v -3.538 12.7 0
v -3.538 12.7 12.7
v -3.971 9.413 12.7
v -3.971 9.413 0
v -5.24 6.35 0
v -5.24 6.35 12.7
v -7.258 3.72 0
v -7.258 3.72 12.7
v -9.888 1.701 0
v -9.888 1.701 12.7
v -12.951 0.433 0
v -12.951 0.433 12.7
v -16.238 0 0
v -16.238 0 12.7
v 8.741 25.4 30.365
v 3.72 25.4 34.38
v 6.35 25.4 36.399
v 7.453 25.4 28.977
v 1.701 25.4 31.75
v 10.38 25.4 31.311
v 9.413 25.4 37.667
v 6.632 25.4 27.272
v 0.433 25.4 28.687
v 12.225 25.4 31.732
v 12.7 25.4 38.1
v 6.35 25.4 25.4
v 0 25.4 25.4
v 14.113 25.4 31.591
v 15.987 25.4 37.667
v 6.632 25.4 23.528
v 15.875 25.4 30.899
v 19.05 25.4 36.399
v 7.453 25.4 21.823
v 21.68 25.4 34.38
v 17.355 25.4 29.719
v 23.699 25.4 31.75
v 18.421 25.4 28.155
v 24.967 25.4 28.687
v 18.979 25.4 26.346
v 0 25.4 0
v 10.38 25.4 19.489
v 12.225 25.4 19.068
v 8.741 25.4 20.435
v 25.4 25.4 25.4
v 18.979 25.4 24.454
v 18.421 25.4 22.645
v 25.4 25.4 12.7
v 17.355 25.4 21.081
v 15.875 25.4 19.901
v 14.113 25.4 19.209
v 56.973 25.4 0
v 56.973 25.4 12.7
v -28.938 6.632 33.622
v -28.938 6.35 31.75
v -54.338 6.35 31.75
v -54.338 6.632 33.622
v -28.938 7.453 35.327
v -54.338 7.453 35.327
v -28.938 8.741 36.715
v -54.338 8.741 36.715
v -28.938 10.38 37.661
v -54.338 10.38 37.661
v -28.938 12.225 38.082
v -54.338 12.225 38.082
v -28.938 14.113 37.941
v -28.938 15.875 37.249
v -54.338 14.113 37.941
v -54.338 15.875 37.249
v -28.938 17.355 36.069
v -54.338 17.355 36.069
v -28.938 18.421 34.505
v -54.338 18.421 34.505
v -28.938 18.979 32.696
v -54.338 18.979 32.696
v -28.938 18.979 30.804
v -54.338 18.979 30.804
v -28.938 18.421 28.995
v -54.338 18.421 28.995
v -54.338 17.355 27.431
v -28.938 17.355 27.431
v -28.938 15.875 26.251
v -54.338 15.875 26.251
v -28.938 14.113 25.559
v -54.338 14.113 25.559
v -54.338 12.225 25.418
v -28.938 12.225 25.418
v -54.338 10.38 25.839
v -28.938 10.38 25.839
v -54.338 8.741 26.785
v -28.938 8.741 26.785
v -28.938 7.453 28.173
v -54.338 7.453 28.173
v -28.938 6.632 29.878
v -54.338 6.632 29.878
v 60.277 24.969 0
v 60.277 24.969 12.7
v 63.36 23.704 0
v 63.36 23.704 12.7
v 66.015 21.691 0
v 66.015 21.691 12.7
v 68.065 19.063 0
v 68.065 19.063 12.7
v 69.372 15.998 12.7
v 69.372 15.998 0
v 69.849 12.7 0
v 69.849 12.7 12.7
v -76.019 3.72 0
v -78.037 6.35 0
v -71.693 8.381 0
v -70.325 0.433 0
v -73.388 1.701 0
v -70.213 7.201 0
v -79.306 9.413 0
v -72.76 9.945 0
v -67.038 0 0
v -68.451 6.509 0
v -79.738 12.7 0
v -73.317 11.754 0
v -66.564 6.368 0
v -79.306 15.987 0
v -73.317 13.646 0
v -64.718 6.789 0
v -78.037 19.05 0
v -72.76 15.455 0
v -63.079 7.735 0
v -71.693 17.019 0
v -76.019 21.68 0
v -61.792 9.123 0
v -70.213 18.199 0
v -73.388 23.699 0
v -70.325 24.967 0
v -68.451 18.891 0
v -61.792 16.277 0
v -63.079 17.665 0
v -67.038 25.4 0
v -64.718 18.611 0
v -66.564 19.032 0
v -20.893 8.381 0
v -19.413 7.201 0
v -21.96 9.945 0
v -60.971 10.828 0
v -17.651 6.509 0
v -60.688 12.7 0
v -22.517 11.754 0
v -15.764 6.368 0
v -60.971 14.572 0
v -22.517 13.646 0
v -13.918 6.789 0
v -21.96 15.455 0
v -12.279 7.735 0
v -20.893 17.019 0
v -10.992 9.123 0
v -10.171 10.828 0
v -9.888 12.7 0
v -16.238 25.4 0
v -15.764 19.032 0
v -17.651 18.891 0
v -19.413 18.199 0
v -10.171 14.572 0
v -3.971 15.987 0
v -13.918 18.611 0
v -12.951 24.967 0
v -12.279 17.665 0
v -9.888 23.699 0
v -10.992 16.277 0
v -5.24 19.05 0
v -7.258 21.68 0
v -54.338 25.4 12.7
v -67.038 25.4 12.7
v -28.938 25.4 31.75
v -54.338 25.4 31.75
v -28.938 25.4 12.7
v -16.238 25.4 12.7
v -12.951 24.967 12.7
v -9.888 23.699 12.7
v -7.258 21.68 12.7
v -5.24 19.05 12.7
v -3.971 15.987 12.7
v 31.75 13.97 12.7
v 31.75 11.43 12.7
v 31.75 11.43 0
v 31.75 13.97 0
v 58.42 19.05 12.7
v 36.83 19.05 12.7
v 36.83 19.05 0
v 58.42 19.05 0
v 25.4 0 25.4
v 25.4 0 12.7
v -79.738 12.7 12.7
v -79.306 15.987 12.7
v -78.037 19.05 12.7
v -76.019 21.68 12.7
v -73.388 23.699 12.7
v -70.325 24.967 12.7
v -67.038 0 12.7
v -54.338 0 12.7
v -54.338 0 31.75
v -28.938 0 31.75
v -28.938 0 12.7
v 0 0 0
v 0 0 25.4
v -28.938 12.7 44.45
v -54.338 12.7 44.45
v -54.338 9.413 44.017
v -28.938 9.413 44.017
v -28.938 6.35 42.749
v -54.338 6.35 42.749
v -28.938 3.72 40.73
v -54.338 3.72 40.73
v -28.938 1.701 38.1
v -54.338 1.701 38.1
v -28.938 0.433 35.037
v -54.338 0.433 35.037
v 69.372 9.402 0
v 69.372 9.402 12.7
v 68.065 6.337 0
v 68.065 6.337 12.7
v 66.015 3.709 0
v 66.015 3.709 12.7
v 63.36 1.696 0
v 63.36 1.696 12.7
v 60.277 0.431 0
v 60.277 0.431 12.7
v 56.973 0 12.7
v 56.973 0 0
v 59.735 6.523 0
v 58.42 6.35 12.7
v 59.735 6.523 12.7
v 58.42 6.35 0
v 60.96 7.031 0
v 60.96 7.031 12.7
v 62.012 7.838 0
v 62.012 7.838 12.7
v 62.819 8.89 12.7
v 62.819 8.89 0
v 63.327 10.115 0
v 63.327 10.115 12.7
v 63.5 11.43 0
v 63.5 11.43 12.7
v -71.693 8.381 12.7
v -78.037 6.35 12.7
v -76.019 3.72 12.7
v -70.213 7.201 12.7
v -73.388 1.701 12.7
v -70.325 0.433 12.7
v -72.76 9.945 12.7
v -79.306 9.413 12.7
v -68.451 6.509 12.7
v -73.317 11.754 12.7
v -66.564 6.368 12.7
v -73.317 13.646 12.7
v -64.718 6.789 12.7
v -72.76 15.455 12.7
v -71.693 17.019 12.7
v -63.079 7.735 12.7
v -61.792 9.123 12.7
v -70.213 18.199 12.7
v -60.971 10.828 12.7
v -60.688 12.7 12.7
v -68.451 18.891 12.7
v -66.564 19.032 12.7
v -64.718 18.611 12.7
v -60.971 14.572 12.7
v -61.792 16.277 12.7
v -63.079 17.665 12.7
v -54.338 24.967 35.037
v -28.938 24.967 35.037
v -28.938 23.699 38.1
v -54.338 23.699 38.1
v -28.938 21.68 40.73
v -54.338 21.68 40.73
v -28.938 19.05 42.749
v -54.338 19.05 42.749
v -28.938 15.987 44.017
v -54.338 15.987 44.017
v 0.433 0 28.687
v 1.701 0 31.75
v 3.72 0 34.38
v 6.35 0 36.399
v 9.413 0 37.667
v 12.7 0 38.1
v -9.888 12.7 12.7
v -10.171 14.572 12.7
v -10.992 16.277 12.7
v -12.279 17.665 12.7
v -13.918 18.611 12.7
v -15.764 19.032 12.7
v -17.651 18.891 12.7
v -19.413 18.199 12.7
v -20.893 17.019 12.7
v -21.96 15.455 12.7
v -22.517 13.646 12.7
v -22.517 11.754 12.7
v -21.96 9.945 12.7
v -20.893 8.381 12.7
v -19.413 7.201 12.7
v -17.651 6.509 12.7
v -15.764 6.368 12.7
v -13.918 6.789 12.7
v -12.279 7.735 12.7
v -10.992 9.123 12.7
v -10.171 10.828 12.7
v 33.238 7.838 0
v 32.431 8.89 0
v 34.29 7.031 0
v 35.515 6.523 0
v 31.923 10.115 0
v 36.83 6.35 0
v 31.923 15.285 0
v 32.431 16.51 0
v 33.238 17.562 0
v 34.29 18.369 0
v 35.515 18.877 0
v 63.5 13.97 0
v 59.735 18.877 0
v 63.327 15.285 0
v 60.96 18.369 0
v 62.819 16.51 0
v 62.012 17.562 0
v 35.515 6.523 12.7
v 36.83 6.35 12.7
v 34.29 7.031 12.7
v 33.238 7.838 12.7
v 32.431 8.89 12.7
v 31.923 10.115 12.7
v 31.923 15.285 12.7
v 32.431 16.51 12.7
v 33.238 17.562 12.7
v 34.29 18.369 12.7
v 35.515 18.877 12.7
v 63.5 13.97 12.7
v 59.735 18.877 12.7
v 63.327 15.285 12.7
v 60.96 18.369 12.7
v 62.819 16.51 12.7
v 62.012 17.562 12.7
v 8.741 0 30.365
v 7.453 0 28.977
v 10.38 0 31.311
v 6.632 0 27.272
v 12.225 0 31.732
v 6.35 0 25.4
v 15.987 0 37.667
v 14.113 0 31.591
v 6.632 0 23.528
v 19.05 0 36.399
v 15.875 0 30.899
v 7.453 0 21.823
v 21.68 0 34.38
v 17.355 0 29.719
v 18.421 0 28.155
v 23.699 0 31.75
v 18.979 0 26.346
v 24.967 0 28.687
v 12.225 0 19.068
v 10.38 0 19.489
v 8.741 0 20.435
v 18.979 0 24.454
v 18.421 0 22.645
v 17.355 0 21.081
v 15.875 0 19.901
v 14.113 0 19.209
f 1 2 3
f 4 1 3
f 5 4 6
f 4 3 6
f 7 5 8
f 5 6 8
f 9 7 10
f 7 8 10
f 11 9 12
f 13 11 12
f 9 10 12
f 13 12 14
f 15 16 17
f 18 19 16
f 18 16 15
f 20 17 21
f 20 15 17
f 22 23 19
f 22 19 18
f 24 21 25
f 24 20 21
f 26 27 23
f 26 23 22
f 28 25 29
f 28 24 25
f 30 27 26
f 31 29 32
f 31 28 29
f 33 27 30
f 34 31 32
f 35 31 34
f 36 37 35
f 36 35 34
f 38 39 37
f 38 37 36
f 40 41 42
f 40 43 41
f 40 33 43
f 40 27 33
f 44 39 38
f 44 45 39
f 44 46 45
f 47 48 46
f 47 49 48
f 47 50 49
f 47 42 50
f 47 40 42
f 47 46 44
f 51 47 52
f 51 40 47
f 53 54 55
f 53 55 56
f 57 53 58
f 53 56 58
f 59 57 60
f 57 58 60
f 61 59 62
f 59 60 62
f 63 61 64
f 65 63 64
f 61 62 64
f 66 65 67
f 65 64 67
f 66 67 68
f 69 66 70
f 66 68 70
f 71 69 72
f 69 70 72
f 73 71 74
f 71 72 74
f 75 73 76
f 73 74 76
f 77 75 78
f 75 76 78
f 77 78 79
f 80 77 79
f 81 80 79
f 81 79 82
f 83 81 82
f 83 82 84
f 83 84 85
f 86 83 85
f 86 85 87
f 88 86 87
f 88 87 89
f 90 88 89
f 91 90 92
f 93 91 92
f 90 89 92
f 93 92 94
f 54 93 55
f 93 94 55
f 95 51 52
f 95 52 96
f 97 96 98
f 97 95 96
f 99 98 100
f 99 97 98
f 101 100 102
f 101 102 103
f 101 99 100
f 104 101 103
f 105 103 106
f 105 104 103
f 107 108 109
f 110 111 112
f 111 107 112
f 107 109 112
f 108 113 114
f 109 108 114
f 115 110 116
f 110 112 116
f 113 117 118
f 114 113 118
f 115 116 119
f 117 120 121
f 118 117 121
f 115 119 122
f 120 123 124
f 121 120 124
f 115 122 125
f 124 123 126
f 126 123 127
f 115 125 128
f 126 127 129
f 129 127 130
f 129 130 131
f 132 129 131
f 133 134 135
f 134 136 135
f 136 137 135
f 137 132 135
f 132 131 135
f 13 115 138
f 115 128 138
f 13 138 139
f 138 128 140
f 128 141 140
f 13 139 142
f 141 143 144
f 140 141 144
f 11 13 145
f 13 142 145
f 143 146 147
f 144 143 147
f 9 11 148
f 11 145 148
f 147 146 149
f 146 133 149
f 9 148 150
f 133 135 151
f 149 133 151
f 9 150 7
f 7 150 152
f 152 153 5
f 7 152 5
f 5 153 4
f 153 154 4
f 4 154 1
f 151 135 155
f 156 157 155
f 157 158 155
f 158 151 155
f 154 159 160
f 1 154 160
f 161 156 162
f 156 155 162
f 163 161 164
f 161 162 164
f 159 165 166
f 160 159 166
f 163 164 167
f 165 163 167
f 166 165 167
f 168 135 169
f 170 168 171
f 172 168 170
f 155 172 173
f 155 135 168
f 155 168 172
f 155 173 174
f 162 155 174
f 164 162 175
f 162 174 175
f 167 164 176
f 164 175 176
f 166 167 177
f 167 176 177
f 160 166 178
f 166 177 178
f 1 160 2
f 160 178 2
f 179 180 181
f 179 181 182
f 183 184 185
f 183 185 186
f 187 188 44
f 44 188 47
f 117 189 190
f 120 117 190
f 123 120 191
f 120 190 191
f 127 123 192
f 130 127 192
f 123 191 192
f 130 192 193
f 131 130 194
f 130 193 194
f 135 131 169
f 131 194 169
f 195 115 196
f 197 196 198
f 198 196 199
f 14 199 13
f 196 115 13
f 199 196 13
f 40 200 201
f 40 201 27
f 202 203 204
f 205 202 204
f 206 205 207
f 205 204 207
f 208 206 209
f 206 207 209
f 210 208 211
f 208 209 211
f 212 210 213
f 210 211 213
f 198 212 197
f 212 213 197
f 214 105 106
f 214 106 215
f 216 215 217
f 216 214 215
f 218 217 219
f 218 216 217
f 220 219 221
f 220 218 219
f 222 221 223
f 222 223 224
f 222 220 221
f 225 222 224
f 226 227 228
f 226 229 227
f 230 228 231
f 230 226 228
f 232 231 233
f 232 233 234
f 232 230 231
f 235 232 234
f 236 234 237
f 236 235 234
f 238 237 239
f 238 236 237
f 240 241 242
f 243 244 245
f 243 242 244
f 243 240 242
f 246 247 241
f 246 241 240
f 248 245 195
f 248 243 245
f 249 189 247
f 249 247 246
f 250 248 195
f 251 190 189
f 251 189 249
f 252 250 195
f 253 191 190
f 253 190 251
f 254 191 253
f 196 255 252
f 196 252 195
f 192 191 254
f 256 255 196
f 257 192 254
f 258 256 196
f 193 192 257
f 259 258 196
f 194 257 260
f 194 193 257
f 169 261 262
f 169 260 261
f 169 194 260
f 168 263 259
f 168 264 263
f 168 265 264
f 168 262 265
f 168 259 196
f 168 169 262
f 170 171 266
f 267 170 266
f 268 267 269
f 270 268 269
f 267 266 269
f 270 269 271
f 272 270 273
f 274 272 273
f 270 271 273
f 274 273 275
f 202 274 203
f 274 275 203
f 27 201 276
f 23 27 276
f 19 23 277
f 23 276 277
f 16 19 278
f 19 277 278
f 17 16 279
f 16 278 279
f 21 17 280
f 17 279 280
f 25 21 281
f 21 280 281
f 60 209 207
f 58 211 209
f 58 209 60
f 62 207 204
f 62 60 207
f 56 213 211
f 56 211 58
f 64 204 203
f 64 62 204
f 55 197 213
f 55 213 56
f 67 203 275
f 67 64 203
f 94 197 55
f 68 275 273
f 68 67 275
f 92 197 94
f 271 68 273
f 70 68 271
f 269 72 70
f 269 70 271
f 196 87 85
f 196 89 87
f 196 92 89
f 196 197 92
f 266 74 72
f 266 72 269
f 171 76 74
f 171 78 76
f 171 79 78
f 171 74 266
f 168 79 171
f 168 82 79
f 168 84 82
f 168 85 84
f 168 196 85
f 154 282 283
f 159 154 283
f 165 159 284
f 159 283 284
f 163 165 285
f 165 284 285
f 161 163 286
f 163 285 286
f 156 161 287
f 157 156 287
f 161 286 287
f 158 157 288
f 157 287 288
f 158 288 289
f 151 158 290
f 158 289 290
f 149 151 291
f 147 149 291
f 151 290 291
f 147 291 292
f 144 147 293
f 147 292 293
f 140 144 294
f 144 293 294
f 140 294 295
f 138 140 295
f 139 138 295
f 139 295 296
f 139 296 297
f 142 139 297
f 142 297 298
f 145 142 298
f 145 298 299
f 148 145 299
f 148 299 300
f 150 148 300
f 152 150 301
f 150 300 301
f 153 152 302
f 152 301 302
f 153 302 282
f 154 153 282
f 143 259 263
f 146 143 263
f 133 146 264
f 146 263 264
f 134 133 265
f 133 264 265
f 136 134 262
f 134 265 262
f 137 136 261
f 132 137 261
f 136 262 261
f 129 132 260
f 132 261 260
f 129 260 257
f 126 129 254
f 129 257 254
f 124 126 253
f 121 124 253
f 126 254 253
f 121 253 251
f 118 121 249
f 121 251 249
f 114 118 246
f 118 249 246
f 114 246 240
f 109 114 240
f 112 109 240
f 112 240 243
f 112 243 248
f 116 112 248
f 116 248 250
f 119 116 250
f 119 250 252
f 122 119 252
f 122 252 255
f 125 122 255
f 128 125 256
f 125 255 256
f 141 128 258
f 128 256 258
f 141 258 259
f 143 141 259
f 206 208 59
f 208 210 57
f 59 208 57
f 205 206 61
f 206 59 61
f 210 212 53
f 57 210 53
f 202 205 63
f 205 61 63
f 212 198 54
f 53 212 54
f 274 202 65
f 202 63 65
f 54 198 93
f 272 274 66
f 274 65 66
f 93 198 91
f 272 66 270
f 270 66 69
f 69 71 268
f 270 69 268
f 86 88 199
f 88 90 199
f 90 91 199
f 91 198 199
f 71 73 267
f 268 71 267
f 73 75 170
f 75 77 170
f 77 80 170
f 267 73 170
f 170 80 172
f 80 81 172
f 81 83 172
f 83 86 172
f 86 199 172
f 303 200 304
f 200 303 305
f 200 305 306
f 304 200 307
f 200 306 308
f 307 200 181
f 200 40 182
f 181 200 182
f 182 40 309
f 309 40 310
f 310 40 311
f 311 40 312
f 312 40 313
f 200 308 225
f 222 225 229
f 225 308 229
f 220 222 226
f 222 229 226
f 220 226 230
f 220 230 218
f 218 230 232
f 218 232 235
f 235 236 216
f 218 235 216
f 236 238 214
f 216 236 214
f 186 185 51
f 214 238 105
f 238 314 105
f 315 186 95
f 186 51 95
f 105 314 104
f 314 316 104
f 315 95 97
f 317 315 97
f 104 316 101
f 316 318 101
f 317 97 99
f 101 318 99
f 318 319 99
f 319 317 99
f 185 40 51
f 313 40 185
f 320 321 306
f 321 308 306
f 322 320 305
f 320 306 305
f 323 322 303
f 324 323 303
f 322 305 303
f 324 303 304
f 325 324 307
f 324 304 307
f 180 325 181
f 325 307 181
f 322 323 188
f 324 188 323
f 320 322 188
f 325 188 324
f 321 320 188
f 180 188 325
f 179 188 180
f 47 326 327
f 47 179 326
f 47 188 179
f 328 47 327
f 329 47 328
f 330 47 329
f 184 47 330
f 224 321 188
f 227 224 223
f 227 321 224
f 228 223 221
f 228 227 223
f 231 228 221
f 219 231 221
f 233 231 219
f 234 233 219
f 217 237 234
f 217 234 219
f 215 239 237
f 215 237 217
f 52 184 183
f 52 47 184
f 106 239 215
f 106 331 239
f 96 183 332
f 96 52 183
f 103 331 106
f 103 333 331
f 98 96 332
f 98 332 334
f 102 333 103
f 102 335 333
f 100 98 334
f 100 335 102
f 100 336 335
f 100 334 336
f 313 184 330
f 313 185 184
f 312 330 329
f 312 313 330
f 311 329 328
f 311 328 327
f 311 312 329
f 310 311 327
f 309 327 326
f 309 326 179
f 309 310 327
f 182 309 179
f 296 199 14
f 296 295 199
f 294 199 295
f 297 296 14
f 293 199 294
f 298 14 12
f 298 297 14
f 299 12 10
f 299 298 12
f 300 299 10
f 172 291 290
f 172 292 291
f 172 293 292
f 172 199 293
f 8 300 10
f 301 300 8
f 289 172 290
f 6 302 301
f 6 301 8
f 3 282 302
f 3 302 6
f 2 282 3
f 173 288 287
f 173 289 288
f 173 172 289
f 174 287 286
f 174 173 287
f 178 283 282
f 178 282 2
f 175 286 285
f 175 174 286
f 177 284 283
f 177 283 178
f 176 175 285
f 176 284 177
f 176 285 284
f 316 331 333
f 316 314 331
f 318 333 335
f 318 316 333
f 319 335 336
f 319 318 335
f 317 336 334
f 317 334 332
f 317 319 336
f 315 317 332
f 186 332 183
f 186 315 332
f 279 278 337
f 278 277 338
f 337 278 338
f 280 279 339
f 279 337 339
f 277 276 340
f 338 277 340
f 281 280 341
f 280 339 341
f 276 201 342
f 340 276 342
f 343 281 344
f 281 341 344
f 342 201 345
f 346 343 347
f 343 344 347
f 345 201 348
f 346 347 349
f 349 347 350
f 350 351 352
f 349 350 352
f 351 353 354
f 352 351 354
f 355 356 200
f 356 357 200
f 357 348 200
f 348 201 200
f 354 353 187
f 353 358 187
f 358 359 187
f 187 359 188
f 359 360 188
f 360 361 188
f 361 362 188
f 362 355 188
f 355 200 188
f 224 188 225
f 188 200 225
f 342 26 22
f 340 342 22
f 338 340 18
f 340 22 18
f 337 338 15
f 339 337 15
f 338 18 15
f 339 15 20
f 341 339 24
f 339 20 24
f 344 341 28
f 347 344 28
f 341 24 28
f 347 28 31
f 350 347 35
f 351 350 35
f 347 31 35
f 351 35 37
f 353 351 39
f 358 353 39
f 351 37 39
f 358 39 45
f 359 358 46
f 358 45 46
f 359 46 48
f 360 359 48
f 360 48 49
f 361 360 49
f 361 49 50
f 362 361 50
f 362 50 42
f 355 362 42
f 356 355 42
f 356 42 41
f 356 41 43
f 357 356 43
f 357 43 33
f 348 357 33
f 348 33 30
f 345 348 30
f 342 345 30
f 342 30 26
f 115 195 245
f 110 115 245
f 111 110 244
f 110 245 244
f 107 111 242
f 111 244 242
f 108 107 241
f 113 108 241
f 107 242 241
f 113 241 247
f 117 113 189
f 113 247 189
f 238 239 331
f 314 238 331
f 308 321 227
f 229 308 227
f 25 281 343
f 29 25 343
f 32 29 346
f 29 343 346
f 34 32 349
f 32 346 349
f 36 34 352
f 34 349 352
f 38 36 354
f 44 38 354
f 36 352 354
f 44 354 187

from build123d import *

# Parameters (mm, degrees)
F0_W         = 69.85
F0_H         = 25.4
F1_DEPTH     = 12.7
F2_W         = 25.4
F2_H         = 25.4
F3_DEPTH     = 25.4
F5_D         = 12.7
F6_W         = 31.75
F6_H         = 12.7
F7_DEPTH     = 12.7
F9_DEPTH     = 25.4
F10_DEPTH    = 25.4
F11_R        = 5.08
F12_T1_DEPTH = 77.0870757085
F13_W        = 76.2
F13_H        = 25.4
F14_DEPTH    = 12.7
F15_W        = 25.4
F15_H        = 25.4
F16_DEPTH    = 31.75
F17_R        = 6.35
F18_DEPTH    = 12.7
F19_R        = 6.35
F20_DEPTH    = 12.7
F21_R        = 6.35
F22_DEPTH    = 25.4


# Not quite as in the source:
# - a fillet or chamfer that OpenCascade refuses, or shapes differently, is made with other operations: its cross-section is extruded or revolved along the edge and cut away or added


with BuildPart() as f1:
    # F0 (on Top) → F1 (new body)
    with BuildSketch(Plane.XY):
        with Locations((34.925, 12.7)):
            Rectangle(F0_W, F0_H)
    extrude(amount=F1_DEPTH)

    # F2 (on face) → F3 (join)
    with BuildSketch(Plane.XY.offset(12.7)):
        with Locations((12.7, 12.7)):
            Rectangle(F2_W, F2_H)
    extrude(amount=F3_DEPTH)

    # F5 (through all)
    with Locations(Plane.XZ):
        with Locations((12.7, 25.4)):
            Hole(F5_D / 2)

    # F6 (on face) → F7 (cut)
    with BuildSketch(Plane.XY.offset(12.7)):
        with Locations((47.625, 12.7)):
            Rectangle(F6_W, F6_H)
    extrude(amount=-F7_DEPTH, mode=Mode.SUBTRACT)

    # F8 (on face) → F9 (cut)
    with BuildSketch(Plane.XZ):
        with BuildLine():
            ThreePointArc((0, 25.4), (3.7197438789, 34.3802561211), (12.7, 38.1))
            Line((12.7, 38.1), (0, 38.1))
            Line((0, 38.1), (0, 25.4))
        make_face()
    extrude(amount=-F9_DEPTH, mode=Mode.SUBTRACT)

    # F8 (on face) → F10 (cut)
    with BuildSketch(Plane.XZ):
        with BuildLine():
            ThreePointArc((12.7, 38.1), (21.6802561211, 34.3802561211), (25.4, 25.4))
            Line((25.4, 25.4), (25.4, 38.1))
            Line((25.4, 38.1), (12.7, 38.1))
        make_face()
    extrude(amount=-F10_DEPTH, mode=Mode.SUBTRACT)

    # F11
    f11_edges = [f1.edges().sort_by_distance(p)[0] for p in [
        (31.75, 19.05, 6.35),
        (31.75, 6.35, 6.35),
        (63.5, 19.05, 6.35),
        (63.5, 6.35, 6.35),
    ]]
    fillet(f11_edges, radius=F11_R)

    # F12: fillet of radius 12.8774151417 on 2 edges, made by hand

    # F12_s2 → F12_t1 (cut)
    with BuildSketch(Plane.XY.offset(-32.1935378542)):
        with BuildLine():
            ThreePointArc((56.9725848583, 25.4), (66.0782924292, 21.6282924292), (69.85, 12.5225848583))
            Line((69.85, 12.5225848583), (69.85, 25.4))
            Line((69.85, 25.4), (56.9725848583, 25.4))
        make_face()
        with BuildLine():
            ThreePointArc((69.85, 12.8774151417), (66.0782924292, 3.7717075708), (56.9725848583, 0))
            Line((56.9725848583, 0), (69.85, 0))
            Line((69.85, 0), (69.85, 12.8774151417))
        make_face()
    extrude(amount=F12_T1_DEPTH, mode=Mode.SUBTRACT)


with BuildPart() as f14:
    # F13 (on Top) → F14 (new body)
    with BuildSketch(Plane.XY):
        with Locations((-41.638404093, 12.7)):
            Rectangle(F13_W, F13_H)
    extrude(amount=F14_DEPTH)

    # F15 (on face) → F16 (join)
    with BuildSketch(Plane.XY.offset(12.7)):
        with Locations((-41.638404093, 12.7)):
            Rectangle(F15_W, F15_H)
    extrude(amount=F16_DEPTH)

    # F17 (on face) → F18 (cut)
    with BuildSketch(Plane.XY.offset(12.7)):
        with Locations((-16.238404093, 12.7)):
            Circle(F17_R)
        with BuildLine():
            ThreePointArc((-16.238404093, 25.4), (-7.2581479719, 21.6802561211), (-3.538404093, 12.7))
            Line((-3.538404093, 12.7), (-3.538404093, 25.4))
            Line((-3.538404093, 25.4), (-16.238404093, 25.4))
        make_face()
        with BuildLine():
            ThreePointArc((-3.538404093, 12.7), (-7.2581479719, 3.7197438789), (-16.238404093, 0))
            Line((-16.238404093, 0), (-3.538404093, 0))
            Line((-3.538404093, 0), (-3.538404093, 12.7))
        make_face()
    extrude(amount=-F18_DEPTH, mode=Mode.SUBTRACT)

    # F19 (on face) → F20 (cut)
    with BuildSketch(Plane.XY.offset(12.7)):
        with Locations((-67.038404093, 12.7)):
            Circle(F19_R)
        with BuildLine():
            ThreePointArc((-79.738404093, 12.7), (-76.0186602141, 21.6802561211), (-67.038404093, 25.4))
            Line((-67.038404093, 25.4), (-79.738404093, 25.4))
            Line((-79.738404093, 25.4), (-79.738404093, 12.7))
        make_face()
        with BuildLine():
            ThreePointArc((-67.038404093, 0), (-76.0186602141, 3.7197438789), (-79.738404093, 12.7))
            Line((-79.738404093, 12.7), (-79.738404093, 0))
            Line((-79.738404093, 0), (-67.038404093, 0))
        make_face()
    extrude(amount=-F20_DEPTH, mode=Mode.SUBTRACT)

    # F21 (on face) → F22 (cut)
    with BuildSketch(Plane(origin=(-54.338404093, 0, 0), x_dir=(0, -1, 0), z_dir=(-1, 0, 0))):
        with Locations((-12.7, 31.75)):
            Circle(F21_R)
        with BuildLine():
            ThreePointArc((-25.4, 31.75), (-21.6802561211, 40.7302561211), (-12.7, 44.45))
            Line((-12.7, 44.45), (-25.4, 44.45))
            Line((-25.4, 44.45), (-25.4, 31.75))
        make_face()
        with BuildLine():
            ThreePointArc((-12.7, 44.45), (-3.7197438789, 40.7302561211), (0, 31.75))
            Line((0, 31.75), (0, 44.45))
            Line((0, 44.45), (-12.7, 44.45))
        make_face()
    extrude(amount=-F22_DEPTH, mode=Mode.SUBTRACT)


solid = Compound([f1.part, f14.part])
